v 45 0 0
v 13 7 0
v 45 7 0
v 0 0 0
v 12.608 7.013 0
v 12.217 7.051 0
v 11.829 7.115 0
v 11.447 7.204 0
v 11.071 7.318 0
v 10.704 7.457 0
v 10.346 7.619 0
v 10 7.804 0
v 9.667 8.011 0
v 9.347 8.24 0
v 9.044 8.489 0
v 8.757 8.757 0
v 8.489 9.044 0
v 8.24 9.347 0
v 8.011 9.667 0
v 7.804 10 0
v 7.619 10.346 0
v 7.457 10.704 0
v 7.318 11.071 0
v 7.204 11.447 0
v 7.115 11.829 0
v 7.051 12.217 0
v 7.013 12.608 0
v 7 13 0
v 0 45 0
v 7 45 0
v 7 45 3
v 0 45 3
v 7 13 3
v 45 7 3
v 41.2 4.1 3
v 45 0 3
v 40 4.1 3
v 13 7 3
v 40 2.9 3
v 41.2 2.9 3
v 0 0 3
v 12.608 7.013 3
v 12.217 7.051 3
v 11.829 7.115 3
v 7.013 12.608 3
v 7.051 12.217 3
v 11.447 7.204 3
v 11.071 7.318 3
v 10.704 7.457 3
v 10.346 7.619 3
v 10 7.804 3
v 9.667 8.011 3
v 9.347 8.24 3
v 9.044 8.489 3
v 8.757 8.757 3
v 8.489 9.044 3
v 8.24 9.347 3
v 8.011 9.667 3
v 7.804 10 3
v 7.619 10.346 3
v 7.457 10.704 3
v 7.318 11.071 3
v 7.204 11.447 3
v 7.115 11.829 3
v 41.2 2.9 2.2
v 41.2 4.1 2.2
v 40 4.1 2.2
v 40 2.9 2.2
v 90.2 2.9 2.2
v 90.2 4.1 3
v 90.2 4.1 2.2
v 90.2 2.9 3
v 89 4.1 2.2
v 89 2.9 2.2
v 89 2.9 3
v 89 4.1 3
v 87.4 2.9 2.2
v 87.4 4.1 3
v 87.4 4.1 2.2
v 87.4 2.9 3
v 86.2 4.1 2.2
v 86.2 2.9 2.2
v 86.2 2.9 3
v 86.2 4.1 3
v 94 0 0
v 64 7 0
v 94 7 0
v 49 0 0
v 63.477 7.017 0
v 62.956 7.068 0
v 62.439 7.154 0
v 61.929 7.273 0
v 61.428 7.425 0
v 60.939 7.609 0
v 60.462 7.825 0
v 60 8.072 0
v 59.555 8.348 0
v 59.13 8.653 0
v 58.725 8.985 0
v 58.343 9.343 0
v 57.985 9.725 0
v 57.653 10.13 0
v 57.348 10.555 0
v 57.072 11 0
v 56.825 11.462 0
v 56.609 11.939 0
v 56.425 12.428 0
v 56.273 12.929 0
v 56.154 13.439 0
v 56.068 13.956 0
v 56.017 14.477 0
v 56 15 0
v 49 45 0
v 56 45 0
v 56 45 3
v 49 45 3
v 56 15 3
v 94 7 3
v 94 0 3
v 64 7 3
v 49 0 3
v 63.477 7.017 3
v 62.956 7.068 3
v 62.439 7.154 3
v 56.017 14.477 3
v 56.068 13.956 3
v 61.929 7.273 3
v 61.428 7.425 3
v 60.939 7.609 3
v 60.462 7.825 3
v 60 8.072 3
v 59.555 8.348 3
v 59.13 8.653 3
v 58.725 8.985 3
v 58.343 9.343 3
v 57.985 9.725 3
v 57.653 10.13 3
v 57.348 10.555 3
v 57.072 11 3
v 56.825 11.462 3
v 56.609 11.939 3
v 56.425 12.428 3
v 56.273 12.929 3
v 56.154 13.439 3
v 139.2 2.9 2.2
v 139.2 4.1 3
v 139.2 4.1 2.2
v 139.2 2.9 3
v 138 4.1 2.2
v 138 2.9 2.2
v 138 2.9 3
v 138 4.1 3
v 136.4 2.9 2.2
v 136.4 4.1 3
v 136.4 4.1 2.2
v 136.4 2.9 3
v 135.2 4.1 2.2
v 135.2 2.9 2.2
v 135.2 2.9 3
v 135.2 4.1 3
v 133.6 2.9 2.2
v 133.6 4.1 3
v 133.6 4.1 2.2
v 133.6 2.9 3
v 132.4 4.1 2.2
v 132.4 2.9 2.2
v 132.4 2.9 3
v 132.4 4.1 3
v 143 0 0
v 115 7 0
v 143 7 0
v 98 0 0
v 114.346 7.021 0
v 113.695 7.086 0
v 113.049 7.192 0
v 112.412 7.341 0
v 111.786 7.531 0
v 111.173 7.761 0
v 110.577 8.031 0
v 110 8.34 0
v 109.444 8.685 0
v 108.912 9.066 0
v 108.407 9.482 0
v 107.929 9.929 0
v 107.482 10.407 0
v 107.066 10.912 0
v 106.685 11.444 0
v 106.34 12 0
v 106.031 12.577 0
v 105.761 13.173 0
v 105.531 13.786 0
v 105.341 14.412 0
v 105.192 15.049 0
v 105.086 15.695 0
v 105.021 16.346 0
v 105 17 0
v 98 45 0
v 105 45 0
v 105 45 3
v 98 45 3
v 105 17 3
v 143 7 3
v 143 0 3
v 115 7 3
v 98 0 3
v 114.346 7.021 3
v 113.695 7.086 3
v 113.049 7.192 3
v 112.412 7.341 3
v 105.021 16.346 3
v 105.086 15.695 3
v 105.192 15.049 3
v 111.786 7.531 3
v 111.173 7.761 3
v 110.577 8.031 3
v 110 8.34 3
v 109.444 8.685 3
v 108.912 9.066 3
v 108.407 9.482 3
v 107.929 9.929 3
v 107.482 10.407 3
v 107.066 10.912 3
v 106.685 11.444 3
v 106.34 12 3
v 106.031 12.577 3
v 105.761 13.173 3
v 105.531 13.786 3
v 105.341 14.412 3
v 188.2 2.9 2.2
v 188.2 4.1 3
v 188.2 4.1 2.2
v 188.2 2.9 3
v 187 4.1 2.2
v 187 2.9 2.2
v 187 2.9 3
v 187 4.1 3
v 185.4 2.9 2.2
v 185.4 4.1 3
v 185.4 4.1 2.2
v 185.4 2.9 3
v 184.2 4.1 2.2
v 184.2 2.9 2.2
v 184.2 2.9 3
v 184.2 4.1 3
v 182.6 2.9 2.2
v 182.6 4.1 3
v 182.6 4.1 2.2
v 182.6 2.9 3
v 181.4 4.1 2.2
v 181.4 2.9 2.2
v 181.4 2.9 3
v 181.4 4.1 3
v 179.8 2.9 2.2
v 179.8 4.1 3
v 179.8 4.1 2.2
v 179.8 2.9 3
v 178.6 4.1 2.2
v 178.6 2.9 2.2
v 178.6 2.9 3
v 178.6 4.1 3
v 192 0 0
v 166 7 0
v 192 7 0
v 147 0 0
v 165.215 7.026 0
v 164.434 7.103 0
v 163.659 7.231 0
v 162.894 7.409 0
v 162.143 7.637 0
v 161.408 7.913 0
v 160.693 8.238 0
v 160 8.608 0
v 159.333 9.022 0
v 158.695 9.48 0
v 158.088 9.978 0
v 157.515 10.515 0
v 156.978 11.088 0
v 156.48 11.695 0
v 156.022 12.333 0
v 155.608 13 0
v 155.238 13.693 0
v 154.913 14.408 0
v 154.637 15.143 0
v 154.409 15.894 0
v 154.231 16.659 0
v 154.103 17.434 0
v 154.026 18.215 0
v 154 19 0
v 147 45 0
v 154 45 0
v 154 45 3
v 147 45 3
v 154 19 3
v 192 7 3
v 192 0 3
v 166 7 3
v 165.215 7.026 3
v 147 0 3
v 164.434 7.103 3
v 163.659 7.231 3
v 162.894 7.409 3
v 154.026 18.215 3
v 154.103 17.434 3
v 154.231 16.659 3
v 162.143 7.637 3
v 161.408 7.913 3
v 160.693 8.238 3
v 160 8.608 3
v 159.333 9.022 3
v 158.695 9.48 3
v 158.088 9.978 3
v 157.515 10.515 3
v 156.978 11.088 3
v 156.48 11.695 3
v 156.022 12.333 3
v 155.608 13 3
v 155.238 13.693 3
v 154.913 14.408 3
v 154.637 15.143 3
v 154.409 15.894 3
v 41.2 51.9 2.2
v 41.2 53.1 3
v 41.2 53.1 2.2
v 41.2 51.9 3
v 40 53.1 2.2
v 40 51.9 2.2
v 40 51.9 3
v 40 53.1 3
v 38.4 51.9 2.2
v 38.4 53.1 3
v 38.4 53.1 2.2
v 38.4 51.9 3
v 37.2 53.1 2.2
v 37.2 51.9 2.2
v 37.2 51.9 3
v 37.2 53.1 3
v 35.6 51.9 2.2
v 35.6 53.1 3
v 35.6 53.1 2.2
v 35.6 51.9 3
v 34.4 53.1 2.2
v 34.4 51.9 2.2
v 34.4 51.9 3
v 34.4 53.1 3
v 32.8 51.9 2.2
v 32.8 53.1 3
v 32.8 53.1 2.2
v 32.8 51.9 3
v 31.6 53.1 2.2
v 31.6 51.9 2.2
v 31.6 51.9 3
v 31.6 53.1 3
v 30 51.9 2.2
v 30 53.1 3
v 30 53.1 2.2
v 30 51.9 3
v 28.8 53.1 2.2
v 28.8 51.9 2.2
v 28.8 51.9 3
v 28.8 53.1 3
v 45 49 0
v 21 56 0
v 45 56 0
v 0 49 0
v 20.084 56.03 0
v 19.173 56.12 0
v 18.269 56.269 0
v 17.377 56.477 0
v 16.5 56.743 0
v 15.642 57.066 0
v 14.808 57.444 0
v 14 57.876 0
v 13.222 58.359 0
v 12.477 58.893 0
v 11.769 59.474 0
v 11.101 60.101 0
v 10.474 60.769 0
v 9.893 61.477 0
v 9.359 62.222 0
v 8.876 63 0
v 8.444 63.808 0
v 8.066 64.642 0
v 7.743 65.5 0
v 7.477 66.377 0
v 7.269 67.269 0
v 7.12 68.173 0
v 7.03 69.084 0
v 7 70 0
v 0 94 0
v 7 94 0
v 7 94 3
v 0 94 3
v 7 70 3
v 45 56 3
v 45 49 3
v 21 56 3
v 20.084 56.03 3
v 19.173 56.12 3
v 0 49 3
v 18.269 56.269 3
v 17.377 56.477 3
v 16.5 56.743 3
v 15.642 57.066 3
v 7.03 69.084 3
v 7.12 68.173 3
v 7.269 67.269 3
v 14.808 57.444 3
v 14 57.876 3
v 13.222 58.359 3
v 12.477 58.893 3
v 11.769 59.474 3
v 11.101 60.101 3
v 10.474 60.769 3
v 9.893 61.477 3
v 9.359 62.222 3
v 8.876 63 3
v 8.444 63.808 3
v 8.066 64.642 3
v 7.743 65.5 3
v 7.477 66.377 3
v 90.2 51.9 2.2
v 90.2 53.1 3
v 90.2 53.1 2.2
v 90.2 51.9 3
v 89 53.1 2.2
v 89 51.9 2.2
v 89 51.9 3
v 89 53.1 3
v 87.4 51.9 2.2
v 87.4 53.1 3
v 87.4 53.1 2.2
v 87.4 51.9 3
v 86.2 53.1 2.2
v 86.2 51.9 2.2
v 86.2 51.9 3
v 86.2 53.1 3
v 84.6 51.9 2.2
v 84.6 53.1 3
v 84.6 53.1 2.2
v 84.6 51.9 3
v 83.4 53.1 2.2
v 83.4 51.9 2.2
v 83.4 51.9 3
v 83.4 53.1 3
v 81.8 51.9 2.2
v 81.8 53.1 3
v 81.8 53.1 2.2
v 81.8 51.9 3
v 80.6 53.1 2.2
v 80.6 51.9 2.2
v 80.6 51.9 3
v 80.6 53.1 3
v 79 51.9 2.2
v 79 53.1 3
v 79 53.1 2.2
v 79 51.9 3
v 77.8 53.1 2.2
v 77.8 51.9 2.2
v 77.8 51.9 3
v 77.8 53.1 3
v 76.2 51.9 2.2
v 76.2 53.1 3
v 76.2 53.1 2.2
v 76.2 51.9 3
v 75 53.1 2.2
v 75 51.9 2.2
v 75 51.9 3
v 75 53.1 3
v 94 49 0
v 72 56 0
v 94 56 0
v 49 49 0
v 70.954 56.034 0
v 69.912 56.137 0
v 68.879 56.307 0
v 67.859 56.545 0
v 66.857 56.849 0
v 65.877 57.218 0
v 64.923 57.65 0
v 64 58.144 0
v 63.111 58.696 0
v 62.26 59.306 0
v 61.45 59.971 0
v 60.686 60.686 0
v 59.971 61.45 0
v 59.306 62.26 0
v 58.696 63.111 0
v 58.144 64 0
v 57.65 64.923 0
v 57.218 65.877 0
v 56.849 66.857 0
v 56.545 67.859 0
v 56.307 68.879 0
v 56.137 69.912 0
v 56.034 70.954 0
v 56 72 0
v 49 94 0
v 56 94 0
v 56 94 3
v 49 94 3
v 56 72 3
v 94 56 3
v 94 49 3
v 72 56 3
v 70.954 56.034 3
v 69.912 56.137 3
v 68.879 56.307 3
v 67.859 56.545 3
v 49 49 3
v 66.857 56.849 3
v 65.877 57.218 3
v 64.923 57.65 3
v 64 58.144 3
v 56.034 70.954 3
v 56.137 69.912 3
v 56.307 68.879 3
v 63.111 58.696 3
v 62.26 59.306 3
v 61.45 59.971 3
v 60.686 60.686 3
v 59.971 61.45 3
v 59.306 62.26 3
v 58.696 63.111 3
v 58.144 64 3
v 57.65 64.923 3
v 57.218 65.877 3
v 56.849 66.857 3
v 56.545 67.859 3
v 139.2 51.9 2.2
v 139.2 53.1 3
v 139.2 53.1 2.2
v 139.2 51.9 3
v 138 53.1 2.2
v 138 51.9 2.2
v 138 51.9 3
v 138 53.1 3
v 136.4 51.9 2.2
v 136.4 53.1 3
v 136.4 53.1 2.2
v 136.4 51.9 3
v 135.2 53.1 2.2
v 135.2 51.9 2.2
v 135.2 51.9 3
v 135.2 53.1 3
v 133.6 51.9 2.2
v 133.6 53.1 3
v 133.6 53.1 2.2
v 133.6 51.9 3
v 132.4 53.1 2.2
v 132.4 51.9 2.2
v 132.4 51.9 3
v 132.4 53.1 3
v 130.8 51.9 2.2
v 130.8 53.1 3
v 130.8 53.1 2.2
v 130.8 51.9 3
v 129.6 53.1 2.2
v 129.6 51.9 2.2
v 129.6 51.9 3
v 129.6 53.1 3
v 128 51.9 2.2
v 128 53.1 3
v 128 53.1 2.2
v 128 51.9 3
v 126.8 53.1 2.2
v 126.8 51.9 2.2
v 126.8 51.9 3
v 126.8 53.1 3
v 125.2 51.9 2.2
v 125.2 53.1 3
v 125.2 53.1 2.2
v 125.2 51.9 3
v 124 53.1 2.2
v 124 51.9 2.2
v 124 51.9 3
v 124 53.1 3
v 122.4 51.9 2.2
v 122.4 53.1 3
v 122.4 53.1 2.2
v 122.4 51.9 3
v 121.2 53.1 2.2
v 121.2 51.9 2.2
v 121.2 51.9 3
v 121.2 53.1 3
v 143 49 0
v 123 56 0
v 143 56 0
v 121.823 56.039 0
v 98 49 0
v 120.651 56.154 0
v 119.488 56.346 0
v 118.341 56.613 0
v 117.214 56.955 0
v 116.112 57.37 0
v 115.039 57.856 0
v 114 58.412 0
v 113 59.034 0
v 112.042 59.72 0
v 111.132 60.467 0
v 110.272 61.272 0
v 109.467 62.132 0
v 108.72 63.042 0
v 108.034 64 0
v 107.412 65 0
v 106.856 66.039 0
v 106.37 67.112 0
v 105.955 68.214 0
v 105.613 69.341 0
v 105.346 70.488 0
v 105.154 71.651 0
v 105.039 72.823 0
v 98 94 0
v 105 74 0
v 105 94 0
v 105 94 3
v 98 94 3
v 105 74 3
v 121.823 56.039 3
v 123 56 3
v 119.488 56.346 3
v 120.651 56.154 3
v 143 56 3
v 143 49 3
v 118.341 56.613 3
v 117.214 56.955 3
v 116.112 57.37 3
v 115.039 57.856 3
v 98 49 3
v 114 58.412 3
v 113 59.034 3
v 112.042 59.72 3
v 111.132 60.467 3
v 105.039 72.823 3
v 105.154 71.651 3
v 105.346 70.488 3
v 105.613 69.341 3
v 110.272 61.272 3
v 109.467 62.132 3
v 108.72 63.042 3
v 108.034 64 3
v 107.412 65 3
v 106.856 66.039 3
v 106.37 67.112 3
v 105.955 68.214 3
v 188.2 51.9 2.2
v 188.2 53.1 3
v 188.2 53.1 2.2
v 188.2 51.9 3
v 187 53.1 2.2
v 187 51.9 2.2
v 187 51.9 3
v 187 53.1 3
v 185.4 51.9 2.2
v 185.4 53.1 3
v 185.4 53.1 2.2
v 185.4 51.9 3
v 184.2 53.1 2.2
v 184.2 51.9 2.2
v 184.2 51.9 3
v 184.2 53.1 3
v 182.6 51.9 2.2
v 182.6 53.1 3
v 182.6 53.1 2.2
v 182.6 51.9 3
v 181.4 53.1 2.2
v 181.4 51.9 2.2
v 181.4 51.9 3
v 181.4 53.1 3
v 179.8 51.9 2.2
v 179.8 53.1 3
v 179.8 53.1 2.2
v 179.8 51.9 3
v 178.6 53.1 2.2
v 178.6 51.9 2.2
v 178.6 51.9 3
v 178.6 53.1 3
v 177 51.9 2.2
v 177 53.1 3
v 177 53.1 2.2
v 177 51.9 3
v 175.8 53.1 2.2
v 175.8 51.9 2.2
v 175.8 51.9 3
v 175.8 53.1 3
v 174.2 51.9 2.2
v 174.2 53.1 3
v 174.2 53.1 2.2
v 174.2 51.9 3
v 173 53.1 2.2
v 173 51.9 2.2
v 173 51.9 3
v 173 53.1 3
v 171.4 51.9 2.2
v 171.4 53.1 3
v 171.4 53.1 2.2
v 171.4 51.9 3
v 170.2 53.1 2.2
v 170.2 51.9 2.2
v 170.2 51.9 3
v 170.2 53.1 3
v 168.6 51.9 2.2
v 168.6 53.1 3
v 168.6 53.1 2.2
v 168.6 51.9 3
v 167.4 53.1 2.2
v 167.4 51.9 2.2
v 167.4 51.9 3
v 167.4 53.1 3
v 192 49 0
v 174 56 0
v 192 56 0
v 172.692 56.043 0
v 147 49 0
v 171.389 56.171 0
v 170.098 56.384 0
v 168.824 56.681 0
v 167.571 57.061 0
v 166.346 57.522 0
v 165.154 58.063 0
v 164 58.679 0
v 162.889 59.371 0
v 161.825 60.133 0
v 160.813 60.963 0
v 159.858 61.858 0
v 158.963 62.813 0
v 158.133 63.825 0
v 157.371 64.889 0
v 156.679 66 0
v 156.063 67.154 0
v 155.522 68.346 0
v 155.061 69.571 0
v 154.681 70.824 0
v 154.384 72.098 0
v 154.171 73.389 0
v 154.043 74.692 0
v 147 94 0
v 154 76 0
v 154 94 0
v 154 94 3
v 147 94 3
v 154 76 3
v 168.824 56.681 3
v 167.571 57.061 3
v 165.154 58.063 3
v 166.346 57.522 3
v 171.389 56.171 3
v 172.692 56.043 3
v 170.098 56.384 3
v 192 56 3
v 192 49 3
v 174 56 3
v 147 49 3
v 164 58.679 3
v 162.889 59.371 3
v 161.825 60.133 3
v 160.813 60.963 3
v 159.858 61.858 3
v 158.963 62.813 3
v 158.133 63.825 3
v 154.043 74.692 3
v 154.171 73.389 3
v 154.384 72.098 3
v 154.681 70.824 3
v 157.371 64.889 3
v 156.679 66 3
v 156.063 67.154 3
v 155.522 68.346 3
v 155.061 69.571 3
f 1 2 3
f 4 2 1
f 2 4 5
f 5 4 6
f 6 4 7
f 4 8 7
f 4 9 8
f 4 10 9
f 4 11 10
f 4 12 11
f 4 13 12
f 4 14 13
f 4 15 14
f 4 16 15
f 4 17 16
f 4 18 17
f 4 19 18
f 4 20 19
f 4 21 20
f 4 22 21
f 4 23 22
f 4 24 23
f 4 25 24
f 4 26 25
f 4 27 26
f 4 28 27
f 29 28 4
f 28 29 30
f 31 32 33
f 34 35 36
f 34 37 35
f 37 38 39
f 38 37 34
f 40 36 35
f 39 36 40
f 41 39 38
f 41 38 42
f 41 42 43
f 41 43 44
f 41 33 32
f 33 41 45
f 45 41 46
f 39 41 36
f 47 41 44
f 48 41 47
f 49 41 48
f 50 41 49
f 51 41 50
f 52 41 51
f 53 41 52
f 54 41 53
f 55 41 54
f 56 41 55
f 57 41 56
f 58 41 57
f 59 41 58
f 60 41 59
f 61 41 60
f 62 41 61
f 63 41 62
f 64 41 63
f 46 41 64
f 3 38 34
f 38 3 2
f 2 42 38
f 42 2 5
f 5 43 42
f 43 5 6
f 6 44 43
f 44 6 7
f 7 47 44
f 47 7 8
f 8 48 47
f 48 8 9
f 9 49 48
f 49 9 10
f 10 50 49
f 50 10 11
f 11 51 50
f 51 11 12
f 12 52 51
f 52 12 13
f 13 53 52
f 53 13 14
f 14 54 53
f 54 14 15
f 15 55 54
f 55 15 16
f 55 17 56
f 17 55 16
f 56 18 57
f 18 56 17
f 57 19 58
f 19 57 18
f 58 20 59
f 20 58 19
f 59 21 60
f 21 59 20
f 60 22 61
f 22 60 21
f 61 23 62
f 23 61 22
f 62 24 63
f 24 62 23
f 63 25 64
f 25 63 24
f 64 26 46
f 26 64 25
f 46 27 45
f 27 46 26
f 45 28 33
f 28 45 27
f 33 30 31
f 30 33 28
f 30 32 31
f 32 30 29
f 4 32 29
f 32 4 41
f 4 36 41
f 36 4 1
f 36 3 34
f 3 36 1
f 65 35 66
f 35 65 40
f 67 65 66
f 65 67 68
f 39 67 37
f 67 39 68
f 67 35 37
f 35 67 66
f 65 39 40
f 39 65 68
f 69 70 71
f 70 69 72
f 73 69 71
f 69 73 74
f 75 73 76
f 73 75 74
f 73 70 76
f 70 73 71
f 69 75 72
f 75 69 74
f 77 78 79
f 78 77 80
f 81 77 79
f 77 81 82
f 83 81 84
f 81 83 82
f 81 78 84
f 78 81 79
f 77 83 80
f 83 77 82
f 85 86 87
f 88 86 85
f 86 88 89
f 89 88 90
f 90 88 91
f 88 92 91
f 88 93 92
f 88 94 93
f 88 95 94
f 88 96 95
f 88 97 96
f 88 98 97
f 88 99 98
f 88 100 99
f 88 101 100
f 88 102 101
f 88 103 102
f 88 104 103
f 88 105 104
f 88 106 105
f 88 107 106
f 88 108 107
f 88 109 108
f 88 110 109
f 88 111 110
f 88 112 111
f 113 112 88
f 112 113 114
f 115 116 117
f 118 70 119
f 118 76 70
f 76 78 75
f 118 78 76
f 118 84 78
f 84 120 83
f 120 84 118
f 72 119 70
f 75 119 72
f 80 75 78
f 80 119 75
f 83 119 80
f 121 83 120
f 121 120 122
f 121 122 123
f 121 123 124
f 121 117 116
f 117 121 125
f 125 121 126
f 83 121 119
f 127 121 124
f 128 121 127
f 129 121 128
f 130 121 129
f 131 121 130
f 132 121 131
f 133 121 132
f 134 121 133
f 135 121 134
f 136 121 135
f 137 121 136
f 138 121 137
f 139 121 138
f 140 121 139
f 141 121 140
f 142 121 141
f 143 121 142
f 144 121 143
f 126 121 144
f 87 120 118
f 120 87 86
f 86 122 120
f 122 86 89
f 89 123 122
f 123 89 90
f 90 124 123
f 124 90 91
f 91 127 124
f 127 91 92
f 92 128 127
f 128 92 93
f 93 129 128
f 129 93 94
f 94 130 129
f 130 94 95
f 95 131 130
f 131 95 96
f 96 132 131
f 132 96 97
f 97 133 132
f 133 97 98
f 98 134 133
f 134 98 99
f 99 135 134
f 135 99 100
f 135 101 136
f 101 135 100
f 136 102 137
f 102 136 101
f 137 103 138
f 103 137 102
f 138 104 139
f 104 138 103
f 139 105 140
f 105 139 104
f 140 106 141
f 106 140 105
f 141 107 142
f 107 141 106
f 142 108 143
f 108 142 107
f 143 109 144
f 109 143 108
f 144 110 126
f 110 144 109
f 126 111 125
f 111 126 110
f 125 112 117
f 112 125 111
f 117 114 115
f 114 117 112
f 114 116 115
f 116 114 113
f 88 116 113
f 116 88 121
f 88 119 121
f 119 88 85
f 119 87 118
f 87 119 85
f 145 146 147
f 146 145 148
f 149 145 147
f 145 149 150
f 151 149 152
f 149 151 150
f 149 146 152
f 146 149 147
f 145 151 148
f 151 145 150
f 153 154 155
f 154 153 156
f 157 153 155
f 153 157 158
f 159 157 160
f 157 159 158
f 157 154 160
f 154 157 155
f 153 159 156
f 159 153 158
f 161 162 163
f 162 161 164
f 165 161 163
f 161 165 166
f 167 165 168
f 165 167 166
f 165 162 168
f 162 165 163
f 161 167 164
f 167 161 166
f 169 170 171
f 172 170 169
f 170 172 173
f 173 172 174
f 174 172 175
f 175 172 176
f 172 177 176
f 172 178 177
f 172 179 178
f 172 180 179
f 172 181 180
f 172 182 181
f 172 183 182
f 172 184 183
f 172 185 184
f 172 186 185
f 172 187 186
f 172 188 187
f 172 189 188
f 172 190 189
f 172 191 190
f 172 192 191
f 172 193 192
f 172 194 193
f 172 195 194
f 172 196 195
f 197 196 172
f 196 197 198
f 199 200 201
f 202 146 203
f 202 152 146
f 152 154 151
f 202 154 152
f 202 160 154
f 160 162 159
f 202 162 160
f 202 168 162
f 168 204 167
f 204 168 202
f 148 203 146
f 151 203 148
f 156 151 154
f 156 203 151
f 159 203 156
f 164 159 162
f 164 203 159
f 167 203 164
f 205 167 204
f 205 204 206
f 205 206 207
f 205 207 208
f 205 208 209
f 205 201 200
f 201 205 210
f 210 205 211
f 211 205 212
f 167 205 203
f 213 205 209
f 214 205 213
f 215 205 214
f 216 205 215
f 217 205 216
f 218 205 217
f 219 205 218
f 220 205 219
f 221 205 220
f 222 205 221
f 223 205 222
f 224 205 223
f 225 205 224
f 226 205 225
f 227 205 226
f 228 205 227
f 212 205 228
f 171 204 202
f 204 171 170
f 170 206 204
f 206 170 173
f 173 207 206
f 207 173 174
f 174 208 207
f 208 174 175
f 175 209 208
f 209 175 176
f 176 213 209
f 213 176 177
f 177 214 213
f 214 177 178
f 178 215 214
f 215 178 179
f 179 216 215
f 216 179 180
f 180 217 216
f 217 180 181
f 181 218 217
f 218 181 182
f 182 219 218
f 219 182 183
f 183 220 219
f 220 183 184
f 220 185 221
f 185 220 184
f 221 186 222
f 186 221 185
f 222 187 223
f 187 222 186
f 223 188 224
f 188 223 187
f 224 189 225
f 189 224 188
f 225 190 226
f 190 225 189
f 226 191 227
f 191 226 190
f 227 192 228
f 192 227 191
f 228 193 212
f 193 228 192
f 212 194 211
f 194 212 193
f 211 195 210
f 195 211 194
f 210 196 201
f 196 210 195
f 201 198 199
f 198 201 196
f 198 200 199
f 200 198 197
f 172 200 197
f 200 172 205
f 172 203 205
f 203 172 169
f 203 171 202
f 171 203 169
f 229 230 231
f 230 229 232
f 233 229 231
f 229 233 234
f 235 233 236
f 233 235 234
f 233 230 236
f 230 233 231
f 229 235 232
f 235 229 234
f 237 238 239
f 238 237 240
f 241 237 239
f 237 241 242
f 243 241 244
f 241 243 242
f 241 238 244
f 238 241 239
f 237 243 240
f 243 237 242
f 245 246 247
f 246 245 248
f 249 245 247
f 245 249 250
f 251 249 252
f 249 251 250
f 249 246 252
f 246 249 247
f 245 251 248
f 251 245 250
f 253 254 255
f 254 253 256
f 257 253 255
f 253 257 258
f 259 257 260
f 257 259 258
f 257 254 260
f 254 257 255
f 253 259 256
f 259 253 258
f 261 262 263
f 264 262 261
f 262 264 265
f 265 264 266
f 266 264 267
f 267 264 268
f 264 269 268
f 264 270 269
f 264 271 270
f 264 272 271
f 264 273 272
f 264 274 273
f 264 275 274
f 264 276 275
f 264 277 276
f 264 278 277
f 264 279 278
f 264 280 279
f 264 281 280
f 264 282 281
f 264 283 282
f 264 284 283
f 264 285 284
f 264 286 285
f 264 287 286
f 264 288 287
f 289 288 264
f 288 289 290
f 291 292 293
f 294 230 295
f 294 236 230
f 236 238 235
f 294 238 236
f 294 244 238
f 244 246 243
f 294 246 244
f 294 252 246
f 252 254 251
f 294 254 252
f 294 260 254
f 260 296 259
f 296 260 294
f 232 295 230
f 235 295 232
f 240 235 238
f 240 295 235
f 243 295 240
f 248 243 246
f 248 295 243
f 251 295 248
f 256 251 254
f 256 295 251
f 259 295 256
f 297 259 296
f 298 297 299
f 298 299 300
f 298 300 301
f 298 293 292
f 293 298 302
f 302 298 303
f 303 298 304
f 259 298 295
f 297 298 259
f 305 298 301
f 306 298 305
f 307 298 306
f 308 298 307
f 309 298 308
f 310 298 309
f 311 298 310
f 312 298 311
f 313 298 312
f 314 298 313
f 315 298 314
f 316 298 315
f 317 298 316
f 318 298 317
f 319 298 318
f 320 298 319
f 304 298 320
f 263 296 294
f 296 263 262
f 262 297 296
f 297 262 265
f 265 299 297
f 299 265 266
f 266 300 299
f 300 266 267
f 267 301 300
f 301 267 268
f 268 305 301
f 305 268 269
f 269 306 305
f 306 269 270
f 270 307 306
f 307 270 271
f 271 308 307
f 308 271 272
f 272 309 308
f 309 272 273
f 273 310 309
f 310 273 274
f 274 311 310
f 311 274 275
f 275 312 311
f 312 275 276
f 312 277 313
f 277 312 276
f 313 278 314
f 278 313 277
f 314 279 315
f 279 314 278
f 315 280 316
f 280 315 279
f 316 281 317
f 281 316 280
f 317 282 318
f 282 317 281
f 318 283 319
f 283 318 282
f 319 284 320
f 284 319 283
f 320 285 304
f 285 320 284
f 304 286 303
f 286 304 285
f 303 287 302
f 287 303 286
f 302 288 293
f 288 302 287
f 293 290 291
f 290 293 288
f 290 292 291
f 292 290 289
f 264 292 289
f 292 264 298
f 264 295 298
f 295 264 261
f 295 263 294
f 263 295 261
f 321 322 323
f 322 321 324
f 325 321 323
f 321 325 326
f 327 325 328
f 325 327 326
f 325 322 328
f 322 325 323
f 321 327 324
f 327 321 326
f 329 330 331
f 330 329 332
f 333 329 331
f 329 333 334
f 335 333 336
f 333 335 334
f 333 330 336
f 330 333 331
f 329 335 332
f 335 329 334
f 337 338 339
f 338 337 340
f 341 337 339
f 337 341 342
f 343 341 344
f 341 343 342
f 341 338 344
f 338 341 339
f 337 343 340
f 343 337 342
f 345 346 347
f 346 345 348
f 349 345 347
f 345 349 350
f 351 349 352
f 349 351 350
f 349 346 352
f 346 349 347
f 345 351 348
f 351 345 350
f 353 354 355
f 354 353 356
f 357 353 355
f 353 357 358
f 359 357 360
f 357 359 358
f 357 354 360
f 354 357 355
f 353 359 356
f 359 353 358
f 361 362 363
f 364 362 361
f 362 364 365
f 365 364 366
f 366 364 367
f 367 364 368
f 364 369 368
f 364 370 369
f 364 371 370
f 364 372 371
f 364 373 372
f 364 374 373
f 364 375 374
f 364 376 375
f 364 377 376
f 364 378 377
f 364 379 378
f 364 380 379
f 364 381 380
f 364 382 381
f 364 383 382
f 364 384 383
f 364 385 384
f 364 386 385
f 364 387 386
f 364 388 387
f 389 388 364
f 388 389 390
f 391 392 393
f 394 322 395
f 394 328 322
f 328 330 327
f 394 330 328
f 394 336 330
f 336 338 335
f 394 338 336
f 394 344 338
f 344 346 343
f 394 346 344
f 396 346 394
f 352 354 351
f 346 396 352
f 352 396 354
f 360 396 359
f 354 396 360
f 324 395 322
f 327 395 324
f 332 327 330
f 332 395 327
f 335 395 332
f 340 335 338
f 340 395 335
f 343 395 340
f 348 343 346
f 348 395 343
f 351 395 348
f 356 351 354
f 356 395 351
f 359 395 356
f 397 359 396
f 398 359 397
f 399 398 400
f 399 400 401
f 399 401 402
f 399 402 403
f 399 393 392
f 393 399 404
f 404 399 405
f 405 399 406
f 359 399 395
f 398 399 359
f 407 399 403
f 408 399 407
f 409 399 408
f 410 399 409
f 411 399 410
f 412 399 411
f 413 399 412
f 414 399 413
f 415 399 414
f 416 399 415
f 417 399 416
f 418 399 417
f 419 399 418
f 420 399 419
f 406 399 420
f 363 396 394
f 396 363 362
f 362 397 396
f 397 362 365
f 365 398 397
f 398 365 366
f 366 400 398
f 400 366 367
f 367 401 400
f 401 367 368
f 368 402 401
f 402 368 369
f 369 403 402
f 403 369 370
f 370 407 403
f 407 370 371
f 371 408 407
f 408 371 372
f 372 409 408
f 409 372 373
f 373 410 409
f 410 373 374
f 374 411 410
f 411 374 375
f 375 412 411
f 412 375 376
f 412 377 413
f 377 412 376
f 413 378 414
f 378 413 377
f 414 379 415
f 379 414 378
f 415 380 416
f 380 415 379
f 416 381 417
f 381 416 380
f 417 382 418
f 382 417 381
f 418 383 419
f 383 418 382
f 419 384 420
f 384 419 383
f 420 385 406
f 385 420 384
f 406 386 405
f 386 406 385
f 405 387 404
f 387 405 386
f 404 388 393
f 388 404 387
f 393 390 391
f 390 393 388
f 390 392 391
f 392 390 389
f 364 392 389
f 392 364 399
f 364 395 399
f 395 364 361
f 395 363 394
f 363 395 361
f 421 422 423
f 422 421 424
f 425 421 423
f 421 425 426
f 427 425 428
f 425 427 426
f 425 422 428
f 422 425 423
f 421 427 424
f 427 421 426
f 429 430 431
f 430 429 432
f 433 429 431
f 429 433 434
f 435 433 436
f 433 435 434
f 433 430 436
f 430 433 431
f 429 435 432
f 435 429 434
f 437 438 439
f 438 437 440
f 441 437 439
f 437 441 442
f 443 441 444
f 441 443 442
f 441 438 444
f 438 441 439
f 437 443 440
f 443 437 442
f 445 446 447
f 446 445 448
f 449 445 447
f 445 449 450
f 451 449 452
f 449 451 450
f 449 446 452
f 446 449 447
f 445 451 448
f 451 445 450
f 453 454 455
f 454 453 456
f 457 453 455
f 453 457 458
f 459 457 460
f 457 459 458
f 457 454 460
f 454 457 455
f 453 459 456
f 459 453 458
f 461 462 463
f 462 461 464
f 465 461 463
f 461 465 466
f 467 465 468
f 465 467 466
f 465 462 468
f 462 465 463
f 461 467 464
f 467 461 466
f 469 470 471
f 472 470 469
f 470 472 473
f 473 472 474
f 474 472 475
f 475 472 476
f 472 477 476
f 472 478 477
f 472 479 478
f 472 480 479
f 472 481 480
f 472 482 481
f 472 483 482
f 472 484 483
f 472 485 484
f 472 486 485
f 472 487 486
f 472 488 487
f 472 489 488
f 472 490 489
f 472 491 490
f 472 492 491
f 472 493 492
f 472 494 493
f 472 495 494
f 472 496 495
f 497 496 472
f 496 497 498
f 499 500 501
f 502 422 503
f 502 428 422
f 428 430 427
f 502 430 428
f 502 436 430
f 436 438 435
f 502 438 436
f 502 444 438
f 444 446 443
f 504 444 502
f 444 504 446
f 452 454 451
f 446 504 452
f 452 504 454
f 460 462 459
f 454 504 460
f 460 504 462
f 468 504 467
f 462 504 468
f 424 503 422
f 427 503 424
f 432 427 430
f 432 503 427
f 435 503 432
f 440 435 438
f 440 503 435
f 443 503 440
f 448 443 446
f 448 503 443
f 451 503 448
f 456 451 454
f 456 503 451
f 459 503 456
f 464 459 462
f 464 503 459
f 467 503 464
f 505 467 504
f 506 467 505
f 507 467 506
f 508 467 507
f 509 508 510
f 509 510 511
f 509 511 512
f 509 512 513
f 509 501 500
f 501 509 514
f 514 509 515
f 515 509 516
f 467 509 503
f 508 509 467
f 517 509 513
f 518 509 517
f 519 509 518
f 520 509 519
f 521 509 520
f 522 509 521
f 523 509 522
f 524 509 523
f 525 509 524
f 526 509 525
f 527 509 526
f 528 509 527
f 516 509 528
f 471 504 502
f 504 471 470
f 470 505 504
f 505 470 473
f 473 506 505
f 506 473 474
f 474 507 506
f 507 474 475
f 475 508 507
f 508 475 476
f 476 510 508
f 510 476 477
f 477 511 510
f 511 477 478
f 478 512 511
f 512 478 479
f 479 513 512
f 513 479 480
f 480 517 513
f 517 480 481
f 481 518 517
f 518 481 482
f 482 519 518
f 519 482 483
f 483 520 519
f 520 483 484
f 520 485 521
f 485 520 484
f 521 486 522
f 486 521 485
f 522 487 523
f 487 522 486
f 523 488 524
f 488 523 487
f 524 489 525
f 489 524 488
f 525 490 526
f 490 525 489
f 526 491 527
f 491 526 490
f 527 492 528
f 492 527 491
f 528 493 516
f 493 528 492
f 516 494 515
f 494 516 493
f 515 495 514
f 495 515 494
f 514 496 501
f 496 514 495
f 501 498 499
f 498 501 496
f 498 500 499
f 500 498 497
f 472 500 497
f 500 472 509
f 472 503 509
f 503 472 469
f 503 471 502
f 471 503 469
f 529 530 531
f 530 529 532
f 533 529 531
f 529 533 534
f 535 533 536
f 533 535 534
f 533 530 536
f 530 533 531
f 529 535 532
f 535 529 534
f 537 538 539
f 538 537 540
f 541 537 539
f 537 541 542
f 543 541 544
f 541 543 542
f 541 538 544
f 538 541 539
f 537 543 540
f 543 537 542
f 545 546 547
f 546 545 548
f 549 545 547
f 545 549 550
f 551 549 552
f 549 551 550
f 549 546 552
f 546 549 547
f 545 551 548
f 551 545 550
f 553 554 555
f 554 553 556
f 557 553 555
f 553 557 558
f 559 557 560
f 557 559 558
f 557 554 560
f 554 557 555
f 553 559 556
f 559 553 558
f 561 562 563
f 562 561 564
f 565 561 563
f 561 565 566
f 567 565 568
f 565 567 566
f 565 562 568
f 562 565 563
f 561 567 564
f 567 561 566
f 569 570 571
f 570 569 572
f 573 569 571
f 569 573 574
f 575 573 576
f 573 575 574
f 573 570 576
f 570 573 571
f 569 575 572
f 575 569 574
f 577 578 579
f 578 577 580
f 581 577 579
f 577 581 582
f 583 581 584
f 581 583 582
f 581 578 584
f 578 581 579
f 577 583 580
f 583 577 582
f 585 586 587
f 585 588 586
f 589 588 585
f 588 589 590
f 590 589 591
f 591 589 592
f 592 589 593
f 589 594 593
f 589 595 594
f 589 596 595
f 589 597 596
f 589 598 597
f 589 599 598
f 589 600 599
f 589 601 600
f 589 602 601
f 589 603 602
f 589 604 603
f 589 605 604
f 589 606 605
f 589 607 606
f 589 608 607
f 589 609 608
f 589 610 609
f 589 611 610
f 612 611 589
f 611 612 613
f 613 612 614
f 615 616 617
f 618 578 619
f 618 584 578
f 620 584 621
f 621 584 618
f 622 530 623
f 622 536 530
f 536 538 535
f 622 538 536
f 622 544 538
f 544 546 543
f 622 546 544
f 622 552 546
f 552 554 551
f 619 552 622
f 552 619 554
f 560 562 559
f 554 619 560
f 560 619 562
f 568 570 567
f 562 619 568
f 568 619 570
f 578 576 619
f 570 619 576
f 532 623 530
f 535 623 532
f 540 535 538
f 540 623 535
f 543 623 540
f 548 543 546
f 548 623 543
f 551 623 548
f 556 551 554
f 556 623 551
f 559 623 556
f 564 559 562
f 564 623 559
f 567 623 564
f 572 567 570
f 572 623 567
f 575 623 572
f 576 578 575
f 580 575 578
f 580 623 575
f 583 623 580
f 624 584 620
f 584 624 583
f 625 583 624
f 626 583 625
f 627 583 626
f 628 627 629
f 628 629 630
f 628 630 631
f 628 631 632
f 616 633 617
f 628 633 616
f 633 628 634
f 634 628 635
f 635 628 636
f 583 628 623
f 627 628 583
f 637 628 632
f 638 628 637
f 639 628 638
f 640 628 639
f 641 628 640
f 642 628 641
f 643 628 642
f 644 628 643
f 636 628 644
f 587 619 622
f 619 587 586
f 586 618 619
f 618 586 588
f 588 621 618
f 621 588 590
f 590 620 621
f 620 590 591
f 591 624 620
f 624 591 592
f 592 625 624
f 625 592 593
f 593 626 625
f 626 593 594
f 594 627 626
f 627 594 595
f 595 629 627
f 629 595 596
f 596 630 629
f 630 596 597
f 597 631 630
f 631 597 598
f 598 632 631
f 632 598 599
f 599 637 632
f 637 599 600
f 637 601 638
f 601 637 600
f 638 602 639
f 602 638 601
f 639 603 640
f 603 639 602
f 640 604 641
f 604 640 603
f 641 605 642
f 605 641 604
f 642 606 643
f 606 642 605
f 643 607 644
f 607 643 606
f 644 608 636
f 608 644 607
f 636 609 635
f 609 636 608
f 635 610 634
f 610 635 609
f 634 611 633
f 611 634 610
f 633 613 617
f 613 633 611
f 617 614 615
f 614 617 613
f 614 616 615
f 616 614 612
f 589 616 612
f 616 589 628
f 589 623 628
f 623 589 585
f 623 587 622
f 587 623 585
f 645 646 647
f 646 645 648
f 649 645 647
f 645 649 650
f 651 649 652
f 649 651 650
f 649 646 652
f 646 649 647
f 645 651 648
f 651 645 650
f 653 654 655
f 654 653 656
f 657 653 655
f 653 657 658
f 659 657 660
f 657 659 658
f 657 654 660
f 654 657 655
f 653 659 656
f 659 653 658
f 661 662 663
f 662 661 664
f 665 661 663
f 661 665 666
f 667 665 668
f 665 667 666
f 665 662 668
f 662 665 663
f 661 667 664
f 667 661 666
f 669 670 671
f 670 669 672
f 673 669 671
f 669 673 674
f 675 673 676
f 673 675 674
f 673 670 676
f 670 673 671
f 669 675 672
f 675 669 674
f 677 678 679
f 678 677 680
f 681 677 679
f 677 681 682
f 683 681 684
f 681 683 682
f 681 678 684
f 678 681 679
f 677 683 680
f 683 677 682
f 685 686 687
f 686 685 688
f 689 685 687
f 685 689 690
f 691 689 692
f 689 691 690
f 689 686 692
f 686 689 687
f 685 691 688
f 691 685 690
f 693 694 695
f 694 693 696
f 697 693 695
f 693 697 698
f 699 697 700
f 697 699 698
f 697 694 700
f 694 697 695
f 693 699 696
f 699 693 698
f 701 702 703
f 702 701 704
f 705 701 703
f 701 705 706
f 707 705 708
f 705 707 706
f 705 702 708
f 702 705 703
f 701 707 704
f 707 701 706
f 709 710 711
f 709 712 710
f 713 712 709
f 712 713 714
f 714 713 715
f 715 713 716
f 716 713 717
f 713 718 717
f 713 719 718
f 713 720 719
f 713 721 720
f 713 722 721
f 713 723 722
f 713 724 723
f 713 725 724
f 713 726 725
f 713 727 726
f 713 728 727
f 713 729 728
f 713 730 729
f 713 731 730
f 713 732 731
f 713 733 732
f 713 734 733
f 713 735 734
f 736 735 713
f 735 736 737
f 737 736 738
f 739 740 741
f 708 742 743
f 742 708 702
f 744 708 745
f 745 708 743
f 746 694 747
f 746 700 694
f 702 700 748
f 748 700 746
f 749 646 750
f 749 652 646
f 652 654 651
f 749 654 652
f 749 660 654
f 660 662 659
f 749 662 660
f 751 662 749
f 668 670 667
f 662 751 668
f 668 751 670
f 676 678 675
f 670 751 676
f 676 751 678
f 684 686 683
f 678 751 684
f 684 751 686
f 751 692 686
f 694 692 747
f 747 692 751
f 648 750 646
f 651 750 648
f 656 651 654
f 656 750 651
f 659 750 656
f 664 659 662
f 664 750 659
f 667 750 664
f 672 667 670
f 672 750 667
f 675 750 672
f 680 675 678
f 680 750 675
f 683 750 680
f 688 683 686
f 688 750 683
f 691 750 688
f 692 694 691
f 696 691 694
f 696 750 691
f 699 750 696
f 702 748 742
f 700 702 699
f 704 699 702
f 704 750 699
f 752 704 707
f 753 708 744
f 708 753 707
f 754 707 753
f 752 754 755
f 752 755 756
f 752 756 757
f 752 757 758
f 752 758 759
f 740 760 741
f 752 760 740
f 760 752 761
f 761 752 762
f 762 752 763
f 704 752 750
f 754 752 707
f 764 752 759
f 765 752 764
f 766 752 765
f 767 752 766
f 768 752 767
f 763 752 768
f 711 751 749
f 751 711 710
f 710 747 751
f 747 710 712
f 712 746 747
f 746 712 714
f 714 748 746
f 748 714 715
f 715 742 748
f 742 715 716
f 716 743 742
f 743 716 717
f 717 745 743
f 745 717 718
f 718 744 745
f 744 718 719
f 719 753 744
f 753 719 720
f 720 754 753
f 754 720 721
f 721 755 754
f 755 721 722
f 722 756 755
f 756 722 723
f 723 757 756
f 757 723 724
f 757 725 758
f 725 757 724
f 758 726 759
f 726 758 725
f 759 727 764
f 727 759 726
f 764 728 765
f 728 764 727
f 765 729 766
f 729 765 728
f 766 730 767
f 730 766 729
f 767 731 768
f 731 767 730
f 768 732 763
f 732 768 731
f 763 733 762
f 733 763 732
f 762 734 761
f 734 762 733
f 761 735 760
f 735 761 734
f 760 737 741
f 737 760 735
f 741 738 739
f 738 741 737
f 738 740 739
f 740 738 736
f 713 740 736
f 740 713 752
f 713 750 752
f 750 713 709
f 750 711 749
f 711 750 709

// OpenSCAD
// scope_corner_gauge.scad — corner-radius gauge for the microscope boom's
// weighted-base platform. PRINT THIS BEFORE THE PLATE.
//
// `CORNER` in scope_plate_common.scad is the one dimension on that model that
// was never measured — it's flagged `⚠ estimate` at 12 mm. Everything else came
// off calipers. That matters more than it sounds: the skirt is a slip fit at
// FIT = 0.4 mm around a 131.84 × 130.54 mm platform, and a corner radius that's
// wrong by a couple of millimetres is exactly what stops a close-fitting skirt
// from seating — the flats look fine and it hangs up on the corners.
//
// Calipers can't read a fillet. This can.
//
// EIGHT female corners, 6 → 20 mm in 2 mm steps. Each is an L with a concave
// 90° corner of a known radius and ~18 mm of straight leg either side to
// register against the platform's flats.
//
// HOW TO USE
//   1. Print flat. Any material — this is a measuring tool, not a part.
//      Fast/draft is fine; corner accuracy comes from the arc, not the finish.
//   2. Count the notches on each gauge's face: 1 = 6 mm, then +2 mm per notch
//      (2 = 8, 3 = 10, 4 = 12 … 8 = 20 mm).
//   3. Press each one onto a corner of the platform. Both legs flat against the
//      platform's straight edges.
//   4. Look at the arc against the corner, ideally with a light behind it:
//        - gap in the MIDDLE of the arc, legs touching  → gauge radius too BIG
//        - gap at the LEG ENDS, arc touching            → gauge radius too SMALL
//        - contact all the way round                    → that's your radius
//   5. Tell me the notch count and I'll set `CORNER` and re-cut the plate.
//
// If it lands between two gauges, say which two — I'll set the midpoint, or add
// a fine gauge at 1 mm steps across that pair.
//
// SPDX-License-Identifier: MIT
// Copyright (c) 2026 Aaron Cupp

/* [Gauge set] */
// Candidate radii, smallest first. Notch count = position in this list.
RADII = [6, 8, 10, 12, 14, 16, 18, 20];

/* [Geometry] */
LEG  = 45.0;  // [30:1:70] mm overall size — must exceed ARM + max radius + a
              //   usable straight run, or the biggest gauge has no legs to
              //   register with. At LEG 45 / ARM 7, the 20 mm gauge still keeps
              //   18 mm of flat either side.
ARM  = 7.0;   // [4:0.5:12] mm arm thickness
THK  = 3.0;   // [2:0.5:6] mm plate thickness

/* [Marking] */
NOTCH = 1.2;  // [0.8:0.1:2.0] mm tally notch size
N_GAP = 1.6;  // [1:0.1:3] mm gap between notches

/* [Layout] */
COLS = 4;     // [1:8] gauges per row on the bed
GAP  = 4.0;   // [2:1:10] mm between gauges

/* [Quality] */
$fn = 96;     // [48:8:160] the arc IS the measurement — keep this high

// One L-shaped gauge with a concave corner of radius r, tallied with n notches.
//
// The cut square is deliberately oversized (3*LEG): `offset(-r)` on a square
// smaller than 2*r collapses to nothing, which would silently produce a gauge
// with no notch cut at all for the larger radii.
module corner_gauge(r, n) {
    difference() {
        linear_extrude(THK)
            difference() {
                square([LEG, LEG]);
                translate([ARM, ARM])
                    offset(r) offset(-r) square([3*LEG, 3*LEG]);
            }
        // tally notches, sunk into the top face of the long arm
        for (i = [0 : n-1])
            translate([LEG - 5 - i*(NOTCH + N_GAP), (ARM - NOTCH)/2, THK - 0.8])
                cube([NOTCH, NOTCH, 1.0]);
    }
}

for (i = [0 : len(RADII) - 1])
    translate([(i % COLS) * (LEG + GAP), floor(i / COLS) * (LEG + GAP), 0])
        corner_gauge(RADII[i], i + 1);
